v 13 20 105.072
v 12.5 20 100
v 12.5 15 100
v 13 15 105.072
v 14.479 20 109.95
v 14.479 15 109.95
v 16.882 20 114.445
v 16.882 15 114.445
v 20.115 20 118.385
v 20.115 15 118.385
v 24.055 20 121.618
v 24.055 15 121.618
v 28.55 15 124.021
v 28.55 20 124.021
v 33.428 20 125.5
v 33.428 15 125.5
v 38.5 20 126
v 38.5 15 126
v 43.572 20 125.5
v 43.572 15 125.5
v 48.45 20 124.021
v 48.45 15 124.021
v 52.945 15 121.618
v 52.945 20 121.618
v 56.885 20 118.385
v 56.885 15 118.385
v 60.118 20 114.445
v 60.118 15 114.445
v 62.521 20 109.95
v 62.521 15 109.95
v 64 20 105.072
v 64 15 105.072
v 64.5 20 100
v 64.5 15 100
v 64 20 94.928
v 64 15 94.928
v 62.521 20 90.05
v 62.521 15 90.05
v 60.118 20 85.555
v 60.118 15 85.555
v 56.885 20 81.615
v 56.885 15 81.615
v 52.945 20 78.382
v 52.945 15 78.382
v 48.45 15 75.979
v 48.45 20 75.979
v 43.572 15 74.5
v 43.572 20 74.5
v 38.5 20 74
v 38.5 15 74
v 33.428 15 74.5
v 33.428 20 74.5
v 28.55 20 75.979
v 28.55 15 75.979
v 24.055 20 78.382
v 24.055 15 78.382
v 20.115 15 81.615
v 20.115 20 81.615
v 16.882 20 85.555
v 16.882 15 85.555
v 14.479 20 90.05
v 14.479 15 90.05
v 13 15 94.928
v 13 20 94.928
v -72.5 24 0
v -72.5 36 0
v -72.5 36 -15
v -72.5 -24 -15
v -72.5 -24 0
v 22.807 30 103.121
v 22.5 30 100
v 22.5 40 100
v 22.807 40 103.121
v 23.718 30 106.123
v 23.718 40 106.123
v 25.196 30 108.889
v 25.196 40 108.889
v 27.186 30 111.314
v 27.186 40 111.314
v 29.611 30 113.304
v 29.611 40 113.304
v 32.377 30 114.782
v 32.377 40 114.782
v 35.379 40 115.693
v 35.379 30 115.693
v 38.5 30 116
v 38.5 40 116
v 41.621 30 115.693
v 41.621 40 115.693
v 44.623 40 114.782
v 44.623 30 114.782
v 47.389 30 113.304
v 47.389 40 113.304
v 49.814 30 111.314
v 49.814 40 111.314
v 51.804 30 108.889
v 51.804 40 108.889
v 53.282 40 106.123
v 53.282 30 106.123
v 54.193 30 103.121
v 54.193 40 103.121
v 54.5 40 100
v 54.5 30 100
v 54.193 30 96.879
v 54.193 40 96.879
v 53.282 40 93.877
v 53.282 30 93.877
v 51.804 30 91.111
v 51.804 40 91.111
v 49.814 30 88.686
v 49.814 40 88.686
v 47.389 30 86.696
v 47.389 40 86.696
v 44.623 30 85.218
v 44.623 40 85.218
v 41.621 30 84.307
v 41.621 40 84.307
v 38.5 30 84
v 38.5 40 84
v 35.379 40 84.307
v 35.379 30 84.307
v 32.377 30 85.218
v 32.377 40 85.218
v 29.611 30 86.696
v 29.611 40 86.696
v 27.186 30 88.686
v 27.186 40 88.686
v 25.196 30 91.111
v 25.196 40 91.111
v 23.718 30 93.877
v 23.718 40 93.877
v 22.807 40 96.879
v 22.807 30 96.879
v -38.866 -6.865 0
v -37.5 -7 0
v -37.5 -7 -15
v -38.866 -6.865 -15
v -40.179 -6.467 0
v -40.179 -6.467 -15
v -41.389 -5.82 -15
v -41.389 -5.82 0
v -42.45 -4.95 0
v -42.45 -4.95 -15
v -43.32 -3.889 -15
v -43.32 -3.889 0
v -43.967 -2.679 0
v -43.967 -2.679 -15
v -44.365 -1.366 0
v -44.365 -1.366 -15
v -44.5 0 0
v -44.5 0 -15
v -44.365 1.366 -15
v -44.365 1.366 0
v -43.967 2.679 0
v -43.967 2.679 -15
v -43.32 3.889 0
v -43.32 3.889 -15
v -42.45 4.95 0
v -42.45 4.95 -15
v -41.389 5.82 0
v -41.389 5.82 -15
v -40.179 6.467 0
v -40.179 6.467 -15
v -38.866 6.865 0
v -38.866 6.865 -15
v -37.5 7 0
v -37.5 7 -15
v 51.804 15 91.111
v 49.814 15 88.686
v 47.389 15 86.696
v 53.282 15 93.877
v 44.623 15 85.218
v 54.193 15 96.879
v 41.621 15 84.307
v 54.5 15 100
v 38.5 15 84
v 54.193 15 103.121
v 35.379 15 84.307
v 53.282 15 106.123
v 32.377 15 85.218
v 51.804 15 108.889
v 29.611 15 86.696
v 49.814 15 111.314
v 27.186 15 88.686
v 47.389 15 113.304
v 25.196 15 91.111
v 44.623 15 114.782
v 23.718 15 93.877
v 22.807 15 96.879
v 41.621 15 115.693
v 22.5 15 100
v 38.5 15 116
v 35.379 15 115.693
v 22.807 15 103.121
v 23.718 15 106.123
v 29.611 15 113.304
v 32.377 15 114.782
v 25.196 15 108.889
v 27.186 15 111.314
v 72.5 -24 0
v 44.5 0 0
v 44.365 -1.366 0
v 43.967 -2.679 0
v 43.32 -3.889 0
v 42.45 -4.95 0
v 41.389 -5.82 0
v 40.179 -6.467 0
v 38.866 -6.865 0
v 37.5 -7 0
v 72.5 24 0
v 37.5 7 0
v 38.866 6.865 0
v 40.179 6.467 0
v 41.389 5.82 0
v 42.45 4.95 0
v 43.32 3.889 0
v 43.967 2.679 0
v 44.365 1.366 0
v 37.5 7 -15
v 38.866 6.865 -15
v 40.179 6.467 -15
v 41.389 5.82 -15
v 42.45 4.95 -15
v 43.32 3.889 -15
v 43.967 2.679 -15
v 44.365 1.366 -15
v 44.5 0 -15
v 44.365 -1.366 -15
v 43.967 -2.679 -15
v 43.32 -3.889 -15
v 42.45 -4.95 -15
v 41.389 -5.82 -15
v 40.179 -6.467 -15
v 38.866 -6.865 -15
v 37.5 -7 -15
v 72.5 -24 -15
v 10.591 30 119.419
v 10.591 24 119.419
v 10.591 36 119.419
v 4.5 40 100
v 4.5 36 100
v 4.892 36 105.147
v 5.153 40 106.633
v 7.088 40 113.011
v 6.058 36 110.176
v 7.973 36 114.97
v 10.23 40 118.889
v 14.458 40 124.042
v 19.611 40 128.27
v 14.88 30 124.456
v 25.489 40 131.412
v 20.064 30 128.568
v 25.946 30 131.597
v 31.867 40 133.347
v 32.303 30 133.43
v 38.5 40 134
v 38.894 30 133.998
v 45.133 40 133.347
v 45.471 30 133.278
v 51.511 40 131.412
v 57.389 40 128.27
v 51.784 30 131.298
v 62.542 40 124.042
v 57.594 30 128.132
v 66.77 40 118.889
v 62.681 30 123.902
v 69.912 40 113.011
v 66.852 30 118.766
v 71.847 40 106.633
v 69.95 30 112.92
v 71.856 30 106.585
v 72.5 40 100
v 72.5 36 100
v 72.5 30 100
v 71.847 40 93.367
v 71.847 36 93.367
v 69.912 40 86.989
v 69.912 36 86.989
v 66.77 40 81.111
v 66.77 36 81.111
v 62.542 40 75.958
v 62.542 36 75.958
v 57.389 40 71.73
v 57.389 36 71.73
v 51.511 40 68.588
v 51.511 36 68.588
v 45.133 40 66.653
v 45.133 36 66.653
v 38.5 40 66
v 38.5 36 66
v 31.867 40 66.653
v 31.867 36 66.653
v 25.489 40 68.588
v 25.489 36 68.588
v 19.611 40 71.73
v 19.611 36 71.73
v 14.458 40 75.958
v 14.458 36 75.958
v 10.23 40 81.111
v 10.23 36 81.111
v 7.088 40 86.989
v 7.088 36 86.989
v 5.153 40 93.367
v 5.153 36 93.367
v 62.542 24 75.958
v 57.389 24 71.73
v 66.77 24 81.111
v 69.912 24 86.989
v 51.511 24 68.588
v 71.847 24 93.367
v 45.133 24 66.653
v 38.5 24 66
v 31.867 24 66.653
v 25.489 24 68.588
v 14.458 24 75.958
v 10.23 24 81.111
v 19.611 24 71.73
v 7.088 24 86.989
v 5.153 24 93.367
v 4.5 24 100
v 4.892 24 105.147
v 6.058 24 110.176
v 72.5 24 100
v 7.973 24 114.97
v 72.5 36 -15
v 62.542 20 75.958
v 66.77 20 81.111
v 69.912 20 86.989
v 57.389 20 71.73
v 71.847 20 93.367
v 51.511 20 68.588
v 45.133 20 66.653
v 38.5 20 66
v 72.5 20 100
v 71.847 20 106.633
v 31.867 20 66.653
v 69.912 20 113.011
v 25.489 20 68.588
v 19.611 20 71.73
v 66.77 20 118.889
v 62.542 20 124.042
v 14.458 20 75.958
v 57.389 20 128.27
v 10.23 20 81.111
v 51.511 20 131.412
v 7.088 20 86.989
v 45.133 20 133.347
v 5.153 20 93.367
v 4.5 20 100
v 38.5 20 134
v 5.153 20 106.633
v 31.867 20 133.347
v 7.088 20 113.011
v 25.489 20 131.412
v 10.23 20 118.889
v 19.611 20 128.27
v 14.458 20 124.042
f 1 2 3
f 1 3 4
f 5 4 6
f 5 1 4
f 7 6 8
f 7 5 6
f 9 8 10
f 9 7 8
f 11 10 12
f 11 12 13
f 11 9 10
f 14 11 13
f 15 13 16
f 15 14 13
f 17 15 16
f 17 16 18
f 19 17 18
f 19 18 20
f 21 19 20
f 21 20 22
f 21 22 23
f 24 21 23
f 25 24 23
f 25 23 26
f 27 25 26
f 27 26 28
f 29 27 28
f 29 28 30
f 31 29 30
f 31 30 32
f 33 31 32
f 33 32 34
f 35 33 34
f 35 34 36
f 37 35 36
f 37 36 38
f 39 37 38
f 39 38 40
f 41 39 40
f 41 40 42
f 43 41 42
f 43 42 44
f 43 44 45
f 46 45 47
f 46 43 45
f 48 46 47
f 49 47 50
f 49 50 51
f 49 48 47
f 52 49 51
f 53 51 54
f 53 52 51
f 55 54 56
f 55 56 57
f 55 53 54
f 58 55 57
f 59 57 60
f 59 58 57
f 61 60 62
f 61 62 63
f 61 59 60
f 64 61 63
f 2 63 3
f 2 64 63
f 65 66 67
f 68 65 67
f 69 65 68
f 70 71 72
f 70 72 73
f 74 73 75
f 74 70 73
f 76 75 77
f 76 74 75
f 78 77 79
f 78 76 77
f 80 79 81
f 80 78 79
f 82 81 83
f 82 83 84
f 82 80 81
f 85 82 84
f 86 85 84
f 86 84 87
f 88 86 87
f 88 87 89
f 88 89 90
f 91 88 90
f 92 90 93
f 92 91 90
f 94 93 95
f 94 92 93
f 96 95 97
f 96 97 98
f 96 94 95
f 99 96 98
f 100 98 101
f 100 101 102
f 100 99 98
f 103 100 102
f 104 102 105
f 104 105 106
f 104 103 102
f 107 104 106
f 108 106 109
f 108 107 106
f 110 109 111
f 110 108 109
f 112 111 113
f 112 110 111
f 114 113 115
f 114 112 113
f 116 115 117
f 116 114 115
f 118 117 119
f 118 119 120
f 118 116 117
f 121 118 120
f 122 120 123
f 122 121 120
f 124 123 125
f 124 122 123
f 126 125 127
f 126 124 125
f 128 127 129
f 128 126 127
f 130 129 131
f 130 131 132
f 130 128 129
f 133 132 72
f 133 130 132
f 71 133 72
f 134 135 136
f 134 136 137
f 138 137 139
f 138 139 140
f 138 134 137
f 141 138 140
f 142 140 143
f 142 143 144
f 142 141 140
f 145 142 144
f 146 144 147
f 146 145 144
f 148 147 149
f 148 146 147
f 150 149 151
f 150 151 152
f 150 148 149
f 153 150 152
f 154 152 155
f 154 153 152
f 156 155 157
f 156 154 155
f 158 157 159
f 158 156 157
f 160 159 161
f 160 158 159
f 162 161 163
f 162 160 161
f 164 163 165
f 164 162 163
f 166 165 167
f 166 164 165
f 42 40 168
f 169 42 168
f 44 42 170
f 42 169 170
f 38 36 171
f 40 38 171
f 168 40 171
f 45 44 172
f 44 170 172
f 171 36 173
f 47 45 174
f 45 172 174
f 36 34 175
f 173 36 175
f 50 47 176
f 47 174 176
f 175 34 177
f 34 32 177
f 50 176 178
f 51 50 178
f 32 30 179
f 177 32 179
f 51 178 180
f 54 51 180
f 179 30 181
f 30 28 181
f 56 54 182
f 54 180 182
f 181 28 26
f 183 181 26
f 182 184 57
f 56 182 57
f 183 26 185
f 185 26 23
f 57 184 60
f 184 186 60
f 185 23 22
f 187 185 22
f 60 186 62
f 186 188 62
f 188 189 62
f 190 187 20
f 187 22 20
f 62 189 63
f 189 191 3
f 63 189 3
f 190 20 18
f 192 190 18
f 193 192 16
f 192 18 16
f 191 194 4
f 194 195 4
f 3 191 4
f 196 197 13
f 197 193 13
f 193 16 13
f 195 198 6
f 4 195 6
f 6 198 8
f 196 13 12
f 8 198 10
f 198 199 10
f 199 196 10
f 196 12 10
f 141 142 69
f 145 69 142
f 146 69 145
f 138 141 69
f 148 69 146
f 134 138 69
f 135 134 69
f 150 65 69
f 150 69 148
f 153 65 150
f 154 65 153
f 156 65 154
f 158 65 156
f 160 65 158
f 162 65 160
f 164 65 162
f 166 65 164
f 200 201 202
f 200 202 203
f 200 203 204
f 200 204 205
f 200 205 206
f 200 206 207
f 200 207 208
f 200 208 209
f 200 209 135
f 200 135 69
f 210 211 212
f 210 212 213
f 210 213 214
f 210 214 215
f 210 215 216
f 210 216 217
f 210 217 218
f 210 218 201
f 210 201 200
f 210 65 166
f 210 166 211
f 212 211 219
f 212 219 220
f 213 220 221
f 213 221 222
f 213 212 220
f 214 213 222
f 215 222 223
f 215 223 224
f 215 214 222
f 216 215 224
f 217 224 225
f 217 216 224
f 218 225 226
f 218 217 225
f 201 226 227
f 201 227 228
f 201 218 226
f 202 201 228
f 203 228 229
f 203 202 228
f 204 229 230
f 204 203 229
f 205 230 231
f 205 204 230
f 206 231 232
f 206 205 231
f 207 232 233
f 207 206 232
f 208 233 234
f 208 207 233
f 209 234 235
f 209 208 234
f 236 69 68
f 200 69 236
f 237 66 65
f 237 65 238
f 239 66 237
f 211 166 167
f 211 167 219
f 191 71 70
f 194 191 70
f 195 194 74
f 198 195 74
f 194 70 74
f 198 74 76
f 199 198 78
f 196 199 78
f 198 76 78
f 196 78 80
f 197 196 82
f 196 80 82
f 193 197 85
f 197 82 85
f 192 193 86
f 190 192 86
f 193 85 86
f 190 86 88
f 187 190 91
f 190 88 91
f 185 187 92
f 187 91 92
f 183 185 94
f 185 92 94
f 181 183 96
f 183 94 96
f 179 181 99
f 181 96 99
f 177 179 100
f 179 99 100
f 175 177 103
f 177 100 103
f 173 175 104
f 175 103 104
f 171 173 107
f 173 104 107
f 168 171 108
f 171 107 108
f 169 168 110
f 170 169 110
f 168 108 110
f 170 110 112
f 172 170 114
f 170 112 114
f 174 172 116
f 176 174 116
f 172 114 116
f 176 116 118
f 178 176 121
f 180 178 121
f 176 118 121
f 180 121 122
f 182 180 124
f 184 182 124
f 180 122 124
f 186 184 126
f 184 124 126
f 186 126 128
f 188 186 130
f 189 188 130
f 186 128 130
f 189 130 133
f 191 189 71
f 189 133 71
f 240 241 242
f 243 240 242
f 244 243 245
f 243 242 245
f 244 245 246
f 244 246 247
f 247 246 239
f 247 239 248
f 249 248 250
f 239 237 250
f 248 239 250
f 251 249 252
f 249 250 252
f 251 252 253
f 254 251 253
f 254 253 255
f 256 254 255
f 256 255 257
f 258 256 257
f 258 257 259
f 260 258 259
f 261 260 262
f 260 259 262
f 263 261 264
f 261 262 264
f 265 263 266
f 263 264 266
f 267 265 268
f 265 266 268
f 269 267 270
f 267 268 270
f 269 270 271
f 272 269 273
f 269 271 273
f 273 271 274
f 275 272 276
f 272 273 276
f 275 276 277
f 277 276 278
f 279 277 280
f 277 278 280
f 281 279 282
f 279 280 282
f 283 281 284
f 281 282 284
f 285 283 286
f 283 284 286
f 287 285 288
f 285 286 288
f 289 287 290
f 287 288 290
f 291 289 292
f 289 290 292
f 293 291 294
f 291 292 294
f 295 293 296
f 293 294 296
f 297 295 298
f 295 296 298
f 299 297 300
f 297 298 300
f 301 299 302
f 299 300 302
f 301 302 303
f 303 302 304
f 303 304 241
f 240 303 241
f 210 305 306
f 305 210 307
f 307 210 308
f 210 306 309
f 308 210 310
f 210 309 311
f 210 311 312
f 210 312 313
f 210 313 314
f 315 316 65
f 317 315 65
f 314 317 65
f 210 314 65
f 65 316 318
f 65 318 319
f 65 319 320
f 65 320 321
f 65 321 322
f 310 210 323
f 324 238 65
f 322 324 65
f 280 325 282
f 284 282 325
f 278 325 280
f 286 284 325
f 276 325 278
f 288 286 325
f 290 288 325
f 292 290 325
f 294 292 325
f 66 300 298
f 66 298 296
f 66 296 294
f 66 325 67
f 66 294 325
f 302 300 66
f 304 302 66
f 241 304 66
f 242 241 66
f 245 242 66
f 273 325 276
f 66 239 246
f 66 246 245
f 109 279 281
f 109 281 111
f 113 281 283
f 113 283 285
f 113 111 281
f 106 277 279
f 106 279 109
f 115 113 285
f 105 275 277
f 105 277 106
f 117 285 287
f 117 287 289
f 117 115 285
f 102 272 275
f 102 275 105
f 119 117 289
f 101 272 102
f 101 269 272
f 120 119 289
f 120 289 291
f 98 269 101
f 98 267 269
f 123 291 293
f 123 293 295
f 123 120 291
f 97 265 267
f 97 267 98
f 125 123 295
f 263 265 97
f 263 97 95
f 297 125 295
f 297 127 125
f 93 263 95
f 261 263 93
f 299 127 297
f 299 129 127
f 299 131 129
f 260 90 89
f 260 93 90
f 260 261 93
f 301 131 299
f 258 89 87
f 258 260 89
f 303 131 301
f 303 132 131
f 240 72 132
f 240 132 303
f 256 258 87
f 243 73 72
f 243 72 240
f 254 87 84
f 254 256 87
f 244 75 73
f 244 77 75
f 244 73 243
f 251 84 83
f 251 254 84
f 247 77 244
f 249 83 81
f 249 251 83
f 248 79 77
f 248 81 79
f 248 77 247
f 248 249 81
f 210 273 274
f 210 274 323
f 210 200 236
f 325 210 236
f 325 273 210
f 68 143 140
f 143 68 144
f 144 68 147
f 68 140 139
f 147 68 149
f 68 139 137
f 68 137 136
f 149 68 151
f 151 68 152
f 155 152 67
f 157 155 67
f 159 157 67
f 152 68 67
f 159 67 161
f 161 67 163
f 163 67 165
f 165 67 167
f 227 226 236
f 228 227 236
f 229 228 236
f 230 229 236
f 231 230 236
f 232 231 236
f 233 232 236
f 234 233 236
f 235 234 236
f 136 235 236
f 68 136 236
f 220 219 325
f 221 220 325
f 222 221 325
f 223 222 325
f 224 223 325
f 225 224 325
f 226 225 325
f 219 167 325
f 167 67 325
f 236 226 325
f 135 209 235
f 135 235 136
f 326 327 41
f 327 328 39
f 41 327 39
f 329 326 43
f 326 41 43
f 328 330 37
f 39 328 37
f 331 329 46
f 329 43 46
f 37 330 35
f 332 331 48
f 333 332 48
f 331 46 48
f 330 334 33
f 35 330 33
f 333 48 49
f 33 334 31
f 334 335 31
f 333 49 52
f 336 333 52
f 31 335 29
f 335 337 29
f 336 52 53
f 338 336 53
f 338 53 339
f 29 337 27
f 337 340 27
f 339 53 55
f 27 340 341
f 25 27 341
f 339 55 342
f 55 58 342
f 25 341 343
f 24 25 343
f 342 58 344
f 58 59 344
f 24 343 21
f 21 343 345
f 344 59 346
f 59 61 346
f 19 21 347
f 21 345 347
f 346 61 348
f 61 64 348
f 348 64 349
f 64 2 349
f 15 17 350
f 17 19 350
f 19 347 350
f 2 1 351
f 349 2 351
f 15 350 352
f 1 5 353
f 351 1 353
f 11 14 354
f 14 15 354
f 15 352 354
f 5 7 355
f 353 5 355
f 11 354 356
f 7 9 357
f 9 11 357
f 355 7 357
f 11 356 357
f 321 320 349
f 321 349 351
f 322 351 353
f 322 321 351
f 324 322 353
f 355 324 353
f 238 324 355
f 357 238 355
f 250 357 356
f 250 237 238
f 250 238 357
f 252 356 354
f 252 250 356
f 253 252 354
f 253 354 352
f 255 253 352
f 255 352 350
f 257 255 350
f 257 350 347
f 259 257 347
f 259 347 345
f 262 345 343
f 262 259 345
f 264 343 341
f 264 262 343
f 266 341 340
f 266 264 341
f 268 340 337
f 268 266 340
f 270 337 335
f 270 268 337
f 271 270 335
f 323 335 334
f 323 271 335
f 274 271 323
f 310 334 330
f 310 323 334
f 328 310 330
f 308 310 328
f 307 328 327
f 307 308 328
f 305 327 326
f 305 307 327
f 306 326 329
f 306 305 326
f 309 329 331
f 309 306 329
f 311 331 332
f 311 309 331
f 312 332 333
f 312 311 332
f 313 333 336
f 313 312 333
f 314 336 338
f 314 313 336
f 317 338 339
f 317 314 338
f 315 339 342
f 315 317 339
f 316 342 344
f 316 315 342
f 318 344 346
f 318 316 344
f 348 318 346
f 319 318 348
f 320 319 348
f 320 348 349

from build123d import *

# Parameters (mm, degrees)
F0_W     = 145
F0_H     = 12
F1_DEPTH = 15
F4_DEPTH = 12
F6_R     = 26
F6_R_2   = 16
F7_DEPTH = 10
F8_DEPTH = 10
F9_DEPTH = 15


with BuildPart() as f1:
    # F0 (on Top) → F1 (new body)
    with BuildSketch(Plane.XY):
        with Locations((0, 30)):
            Rectangle(F0_W, F0_H)
        Polygon((-72.5, 24), (-72.5, 0), (-72.5, -24), (-37.5, -24), (37.5, -24), (72.5, -24), (72.5, 0), (72.5, 24), align=None)
        with BuildLine():
            Line((37.5, -7), (-37.5, -7))
            ThreePointArc((-37.5, -7), (-44.5, 0), (-37.5, 7))
            Line((-37.5, 7), (37.5, 7))
            ThreePointArc((37.5, 7), (44.5, 0), (37.5, -7))
        make_face(mode=Mode.SUBTRACT)
    extrude(amount=-F1_DEPTH)

    # F3 (on offset) → F4 (join)
    with BuildSketch(Plane(origin=(0, 36, 0), x_dir=(-1, 0, 0), z_dir=(0, 1, 0))):
        with BuildLine():
            ThreePointArc((-10.5910955607, 119.4188839277), (-6.0584930148, 110.1758844594), (-4.5, 100))
            ThreePointArc((-4.5, 100), (-38.5, 66), (-72.5, 100))
            Line((-72.5, 100), (-72.5, 0))
            Line((-72.5, 0), (72.5, 0))
            Line((72.5, 0), (-10.5910955607, 119.4188839277))
        make_face()
    extrude(amount=-F4_DEPTH)

    # F6 (on offset) → F7 (join)
    with BuildSketch(Plane(origin=(0, 30, 0), x_dir=(-1, 0, 0), z_dir=(0, 1, 0))):
        with BuildLine():
            ThreePointArc((-72.5, 100), (-38.5, 66), (-4.5, 100))
            ThreePointArc((-4.5, 100), (-38.5, 134), (-72.5, 100))
        make_face()
        with Locations((-38.5, 100)):
            Circle(F6_R, mode=Mode.SUBTRACT)
        with Locations((-38.5, 100)):
            Circle(F6_R)
        with Locations((-38.5, 100)):
            Circle(F6_R_2, mode=Mode.SUBTRACT)
    extrude(amount=F7_DEPTH)

    # F6 (on offset) → F8 (join)
    with BuildSketch(Plane(origin=(0, 30, 0), x_dir=(-1, 0, 0), z_dir=(0, 1, 0))):
        with BuildLine():
            ThreePointArc((-72.5, 100), (-38.5, 66), (-4.5, 100))
            ThreePointArc((-4.5, 100), (-38.5, 134), (-72.5, 100))
        make_face()
        with Locations((-38.5, 100)):
            Circle(F6_R, mode=Mode.SUBTRACT)
    extrude(amount=-F8_DEPTH)

    # F6 (on offset) → F9 (join)
    with BuildSketch(Plane(origin=(0, 30, 0), x_dir=(-1, 0, 0), z_dir=(0, 1, 0))):
        with Locations((-38.5, 100)):
            Circle(F6_R)
        with Locations((-38.5, 100)):
            Circle(F6_R_2, mode=Mode.SUBTRACT)
    extrude(amount=-F9_DEPTH)


solid = f1.part
